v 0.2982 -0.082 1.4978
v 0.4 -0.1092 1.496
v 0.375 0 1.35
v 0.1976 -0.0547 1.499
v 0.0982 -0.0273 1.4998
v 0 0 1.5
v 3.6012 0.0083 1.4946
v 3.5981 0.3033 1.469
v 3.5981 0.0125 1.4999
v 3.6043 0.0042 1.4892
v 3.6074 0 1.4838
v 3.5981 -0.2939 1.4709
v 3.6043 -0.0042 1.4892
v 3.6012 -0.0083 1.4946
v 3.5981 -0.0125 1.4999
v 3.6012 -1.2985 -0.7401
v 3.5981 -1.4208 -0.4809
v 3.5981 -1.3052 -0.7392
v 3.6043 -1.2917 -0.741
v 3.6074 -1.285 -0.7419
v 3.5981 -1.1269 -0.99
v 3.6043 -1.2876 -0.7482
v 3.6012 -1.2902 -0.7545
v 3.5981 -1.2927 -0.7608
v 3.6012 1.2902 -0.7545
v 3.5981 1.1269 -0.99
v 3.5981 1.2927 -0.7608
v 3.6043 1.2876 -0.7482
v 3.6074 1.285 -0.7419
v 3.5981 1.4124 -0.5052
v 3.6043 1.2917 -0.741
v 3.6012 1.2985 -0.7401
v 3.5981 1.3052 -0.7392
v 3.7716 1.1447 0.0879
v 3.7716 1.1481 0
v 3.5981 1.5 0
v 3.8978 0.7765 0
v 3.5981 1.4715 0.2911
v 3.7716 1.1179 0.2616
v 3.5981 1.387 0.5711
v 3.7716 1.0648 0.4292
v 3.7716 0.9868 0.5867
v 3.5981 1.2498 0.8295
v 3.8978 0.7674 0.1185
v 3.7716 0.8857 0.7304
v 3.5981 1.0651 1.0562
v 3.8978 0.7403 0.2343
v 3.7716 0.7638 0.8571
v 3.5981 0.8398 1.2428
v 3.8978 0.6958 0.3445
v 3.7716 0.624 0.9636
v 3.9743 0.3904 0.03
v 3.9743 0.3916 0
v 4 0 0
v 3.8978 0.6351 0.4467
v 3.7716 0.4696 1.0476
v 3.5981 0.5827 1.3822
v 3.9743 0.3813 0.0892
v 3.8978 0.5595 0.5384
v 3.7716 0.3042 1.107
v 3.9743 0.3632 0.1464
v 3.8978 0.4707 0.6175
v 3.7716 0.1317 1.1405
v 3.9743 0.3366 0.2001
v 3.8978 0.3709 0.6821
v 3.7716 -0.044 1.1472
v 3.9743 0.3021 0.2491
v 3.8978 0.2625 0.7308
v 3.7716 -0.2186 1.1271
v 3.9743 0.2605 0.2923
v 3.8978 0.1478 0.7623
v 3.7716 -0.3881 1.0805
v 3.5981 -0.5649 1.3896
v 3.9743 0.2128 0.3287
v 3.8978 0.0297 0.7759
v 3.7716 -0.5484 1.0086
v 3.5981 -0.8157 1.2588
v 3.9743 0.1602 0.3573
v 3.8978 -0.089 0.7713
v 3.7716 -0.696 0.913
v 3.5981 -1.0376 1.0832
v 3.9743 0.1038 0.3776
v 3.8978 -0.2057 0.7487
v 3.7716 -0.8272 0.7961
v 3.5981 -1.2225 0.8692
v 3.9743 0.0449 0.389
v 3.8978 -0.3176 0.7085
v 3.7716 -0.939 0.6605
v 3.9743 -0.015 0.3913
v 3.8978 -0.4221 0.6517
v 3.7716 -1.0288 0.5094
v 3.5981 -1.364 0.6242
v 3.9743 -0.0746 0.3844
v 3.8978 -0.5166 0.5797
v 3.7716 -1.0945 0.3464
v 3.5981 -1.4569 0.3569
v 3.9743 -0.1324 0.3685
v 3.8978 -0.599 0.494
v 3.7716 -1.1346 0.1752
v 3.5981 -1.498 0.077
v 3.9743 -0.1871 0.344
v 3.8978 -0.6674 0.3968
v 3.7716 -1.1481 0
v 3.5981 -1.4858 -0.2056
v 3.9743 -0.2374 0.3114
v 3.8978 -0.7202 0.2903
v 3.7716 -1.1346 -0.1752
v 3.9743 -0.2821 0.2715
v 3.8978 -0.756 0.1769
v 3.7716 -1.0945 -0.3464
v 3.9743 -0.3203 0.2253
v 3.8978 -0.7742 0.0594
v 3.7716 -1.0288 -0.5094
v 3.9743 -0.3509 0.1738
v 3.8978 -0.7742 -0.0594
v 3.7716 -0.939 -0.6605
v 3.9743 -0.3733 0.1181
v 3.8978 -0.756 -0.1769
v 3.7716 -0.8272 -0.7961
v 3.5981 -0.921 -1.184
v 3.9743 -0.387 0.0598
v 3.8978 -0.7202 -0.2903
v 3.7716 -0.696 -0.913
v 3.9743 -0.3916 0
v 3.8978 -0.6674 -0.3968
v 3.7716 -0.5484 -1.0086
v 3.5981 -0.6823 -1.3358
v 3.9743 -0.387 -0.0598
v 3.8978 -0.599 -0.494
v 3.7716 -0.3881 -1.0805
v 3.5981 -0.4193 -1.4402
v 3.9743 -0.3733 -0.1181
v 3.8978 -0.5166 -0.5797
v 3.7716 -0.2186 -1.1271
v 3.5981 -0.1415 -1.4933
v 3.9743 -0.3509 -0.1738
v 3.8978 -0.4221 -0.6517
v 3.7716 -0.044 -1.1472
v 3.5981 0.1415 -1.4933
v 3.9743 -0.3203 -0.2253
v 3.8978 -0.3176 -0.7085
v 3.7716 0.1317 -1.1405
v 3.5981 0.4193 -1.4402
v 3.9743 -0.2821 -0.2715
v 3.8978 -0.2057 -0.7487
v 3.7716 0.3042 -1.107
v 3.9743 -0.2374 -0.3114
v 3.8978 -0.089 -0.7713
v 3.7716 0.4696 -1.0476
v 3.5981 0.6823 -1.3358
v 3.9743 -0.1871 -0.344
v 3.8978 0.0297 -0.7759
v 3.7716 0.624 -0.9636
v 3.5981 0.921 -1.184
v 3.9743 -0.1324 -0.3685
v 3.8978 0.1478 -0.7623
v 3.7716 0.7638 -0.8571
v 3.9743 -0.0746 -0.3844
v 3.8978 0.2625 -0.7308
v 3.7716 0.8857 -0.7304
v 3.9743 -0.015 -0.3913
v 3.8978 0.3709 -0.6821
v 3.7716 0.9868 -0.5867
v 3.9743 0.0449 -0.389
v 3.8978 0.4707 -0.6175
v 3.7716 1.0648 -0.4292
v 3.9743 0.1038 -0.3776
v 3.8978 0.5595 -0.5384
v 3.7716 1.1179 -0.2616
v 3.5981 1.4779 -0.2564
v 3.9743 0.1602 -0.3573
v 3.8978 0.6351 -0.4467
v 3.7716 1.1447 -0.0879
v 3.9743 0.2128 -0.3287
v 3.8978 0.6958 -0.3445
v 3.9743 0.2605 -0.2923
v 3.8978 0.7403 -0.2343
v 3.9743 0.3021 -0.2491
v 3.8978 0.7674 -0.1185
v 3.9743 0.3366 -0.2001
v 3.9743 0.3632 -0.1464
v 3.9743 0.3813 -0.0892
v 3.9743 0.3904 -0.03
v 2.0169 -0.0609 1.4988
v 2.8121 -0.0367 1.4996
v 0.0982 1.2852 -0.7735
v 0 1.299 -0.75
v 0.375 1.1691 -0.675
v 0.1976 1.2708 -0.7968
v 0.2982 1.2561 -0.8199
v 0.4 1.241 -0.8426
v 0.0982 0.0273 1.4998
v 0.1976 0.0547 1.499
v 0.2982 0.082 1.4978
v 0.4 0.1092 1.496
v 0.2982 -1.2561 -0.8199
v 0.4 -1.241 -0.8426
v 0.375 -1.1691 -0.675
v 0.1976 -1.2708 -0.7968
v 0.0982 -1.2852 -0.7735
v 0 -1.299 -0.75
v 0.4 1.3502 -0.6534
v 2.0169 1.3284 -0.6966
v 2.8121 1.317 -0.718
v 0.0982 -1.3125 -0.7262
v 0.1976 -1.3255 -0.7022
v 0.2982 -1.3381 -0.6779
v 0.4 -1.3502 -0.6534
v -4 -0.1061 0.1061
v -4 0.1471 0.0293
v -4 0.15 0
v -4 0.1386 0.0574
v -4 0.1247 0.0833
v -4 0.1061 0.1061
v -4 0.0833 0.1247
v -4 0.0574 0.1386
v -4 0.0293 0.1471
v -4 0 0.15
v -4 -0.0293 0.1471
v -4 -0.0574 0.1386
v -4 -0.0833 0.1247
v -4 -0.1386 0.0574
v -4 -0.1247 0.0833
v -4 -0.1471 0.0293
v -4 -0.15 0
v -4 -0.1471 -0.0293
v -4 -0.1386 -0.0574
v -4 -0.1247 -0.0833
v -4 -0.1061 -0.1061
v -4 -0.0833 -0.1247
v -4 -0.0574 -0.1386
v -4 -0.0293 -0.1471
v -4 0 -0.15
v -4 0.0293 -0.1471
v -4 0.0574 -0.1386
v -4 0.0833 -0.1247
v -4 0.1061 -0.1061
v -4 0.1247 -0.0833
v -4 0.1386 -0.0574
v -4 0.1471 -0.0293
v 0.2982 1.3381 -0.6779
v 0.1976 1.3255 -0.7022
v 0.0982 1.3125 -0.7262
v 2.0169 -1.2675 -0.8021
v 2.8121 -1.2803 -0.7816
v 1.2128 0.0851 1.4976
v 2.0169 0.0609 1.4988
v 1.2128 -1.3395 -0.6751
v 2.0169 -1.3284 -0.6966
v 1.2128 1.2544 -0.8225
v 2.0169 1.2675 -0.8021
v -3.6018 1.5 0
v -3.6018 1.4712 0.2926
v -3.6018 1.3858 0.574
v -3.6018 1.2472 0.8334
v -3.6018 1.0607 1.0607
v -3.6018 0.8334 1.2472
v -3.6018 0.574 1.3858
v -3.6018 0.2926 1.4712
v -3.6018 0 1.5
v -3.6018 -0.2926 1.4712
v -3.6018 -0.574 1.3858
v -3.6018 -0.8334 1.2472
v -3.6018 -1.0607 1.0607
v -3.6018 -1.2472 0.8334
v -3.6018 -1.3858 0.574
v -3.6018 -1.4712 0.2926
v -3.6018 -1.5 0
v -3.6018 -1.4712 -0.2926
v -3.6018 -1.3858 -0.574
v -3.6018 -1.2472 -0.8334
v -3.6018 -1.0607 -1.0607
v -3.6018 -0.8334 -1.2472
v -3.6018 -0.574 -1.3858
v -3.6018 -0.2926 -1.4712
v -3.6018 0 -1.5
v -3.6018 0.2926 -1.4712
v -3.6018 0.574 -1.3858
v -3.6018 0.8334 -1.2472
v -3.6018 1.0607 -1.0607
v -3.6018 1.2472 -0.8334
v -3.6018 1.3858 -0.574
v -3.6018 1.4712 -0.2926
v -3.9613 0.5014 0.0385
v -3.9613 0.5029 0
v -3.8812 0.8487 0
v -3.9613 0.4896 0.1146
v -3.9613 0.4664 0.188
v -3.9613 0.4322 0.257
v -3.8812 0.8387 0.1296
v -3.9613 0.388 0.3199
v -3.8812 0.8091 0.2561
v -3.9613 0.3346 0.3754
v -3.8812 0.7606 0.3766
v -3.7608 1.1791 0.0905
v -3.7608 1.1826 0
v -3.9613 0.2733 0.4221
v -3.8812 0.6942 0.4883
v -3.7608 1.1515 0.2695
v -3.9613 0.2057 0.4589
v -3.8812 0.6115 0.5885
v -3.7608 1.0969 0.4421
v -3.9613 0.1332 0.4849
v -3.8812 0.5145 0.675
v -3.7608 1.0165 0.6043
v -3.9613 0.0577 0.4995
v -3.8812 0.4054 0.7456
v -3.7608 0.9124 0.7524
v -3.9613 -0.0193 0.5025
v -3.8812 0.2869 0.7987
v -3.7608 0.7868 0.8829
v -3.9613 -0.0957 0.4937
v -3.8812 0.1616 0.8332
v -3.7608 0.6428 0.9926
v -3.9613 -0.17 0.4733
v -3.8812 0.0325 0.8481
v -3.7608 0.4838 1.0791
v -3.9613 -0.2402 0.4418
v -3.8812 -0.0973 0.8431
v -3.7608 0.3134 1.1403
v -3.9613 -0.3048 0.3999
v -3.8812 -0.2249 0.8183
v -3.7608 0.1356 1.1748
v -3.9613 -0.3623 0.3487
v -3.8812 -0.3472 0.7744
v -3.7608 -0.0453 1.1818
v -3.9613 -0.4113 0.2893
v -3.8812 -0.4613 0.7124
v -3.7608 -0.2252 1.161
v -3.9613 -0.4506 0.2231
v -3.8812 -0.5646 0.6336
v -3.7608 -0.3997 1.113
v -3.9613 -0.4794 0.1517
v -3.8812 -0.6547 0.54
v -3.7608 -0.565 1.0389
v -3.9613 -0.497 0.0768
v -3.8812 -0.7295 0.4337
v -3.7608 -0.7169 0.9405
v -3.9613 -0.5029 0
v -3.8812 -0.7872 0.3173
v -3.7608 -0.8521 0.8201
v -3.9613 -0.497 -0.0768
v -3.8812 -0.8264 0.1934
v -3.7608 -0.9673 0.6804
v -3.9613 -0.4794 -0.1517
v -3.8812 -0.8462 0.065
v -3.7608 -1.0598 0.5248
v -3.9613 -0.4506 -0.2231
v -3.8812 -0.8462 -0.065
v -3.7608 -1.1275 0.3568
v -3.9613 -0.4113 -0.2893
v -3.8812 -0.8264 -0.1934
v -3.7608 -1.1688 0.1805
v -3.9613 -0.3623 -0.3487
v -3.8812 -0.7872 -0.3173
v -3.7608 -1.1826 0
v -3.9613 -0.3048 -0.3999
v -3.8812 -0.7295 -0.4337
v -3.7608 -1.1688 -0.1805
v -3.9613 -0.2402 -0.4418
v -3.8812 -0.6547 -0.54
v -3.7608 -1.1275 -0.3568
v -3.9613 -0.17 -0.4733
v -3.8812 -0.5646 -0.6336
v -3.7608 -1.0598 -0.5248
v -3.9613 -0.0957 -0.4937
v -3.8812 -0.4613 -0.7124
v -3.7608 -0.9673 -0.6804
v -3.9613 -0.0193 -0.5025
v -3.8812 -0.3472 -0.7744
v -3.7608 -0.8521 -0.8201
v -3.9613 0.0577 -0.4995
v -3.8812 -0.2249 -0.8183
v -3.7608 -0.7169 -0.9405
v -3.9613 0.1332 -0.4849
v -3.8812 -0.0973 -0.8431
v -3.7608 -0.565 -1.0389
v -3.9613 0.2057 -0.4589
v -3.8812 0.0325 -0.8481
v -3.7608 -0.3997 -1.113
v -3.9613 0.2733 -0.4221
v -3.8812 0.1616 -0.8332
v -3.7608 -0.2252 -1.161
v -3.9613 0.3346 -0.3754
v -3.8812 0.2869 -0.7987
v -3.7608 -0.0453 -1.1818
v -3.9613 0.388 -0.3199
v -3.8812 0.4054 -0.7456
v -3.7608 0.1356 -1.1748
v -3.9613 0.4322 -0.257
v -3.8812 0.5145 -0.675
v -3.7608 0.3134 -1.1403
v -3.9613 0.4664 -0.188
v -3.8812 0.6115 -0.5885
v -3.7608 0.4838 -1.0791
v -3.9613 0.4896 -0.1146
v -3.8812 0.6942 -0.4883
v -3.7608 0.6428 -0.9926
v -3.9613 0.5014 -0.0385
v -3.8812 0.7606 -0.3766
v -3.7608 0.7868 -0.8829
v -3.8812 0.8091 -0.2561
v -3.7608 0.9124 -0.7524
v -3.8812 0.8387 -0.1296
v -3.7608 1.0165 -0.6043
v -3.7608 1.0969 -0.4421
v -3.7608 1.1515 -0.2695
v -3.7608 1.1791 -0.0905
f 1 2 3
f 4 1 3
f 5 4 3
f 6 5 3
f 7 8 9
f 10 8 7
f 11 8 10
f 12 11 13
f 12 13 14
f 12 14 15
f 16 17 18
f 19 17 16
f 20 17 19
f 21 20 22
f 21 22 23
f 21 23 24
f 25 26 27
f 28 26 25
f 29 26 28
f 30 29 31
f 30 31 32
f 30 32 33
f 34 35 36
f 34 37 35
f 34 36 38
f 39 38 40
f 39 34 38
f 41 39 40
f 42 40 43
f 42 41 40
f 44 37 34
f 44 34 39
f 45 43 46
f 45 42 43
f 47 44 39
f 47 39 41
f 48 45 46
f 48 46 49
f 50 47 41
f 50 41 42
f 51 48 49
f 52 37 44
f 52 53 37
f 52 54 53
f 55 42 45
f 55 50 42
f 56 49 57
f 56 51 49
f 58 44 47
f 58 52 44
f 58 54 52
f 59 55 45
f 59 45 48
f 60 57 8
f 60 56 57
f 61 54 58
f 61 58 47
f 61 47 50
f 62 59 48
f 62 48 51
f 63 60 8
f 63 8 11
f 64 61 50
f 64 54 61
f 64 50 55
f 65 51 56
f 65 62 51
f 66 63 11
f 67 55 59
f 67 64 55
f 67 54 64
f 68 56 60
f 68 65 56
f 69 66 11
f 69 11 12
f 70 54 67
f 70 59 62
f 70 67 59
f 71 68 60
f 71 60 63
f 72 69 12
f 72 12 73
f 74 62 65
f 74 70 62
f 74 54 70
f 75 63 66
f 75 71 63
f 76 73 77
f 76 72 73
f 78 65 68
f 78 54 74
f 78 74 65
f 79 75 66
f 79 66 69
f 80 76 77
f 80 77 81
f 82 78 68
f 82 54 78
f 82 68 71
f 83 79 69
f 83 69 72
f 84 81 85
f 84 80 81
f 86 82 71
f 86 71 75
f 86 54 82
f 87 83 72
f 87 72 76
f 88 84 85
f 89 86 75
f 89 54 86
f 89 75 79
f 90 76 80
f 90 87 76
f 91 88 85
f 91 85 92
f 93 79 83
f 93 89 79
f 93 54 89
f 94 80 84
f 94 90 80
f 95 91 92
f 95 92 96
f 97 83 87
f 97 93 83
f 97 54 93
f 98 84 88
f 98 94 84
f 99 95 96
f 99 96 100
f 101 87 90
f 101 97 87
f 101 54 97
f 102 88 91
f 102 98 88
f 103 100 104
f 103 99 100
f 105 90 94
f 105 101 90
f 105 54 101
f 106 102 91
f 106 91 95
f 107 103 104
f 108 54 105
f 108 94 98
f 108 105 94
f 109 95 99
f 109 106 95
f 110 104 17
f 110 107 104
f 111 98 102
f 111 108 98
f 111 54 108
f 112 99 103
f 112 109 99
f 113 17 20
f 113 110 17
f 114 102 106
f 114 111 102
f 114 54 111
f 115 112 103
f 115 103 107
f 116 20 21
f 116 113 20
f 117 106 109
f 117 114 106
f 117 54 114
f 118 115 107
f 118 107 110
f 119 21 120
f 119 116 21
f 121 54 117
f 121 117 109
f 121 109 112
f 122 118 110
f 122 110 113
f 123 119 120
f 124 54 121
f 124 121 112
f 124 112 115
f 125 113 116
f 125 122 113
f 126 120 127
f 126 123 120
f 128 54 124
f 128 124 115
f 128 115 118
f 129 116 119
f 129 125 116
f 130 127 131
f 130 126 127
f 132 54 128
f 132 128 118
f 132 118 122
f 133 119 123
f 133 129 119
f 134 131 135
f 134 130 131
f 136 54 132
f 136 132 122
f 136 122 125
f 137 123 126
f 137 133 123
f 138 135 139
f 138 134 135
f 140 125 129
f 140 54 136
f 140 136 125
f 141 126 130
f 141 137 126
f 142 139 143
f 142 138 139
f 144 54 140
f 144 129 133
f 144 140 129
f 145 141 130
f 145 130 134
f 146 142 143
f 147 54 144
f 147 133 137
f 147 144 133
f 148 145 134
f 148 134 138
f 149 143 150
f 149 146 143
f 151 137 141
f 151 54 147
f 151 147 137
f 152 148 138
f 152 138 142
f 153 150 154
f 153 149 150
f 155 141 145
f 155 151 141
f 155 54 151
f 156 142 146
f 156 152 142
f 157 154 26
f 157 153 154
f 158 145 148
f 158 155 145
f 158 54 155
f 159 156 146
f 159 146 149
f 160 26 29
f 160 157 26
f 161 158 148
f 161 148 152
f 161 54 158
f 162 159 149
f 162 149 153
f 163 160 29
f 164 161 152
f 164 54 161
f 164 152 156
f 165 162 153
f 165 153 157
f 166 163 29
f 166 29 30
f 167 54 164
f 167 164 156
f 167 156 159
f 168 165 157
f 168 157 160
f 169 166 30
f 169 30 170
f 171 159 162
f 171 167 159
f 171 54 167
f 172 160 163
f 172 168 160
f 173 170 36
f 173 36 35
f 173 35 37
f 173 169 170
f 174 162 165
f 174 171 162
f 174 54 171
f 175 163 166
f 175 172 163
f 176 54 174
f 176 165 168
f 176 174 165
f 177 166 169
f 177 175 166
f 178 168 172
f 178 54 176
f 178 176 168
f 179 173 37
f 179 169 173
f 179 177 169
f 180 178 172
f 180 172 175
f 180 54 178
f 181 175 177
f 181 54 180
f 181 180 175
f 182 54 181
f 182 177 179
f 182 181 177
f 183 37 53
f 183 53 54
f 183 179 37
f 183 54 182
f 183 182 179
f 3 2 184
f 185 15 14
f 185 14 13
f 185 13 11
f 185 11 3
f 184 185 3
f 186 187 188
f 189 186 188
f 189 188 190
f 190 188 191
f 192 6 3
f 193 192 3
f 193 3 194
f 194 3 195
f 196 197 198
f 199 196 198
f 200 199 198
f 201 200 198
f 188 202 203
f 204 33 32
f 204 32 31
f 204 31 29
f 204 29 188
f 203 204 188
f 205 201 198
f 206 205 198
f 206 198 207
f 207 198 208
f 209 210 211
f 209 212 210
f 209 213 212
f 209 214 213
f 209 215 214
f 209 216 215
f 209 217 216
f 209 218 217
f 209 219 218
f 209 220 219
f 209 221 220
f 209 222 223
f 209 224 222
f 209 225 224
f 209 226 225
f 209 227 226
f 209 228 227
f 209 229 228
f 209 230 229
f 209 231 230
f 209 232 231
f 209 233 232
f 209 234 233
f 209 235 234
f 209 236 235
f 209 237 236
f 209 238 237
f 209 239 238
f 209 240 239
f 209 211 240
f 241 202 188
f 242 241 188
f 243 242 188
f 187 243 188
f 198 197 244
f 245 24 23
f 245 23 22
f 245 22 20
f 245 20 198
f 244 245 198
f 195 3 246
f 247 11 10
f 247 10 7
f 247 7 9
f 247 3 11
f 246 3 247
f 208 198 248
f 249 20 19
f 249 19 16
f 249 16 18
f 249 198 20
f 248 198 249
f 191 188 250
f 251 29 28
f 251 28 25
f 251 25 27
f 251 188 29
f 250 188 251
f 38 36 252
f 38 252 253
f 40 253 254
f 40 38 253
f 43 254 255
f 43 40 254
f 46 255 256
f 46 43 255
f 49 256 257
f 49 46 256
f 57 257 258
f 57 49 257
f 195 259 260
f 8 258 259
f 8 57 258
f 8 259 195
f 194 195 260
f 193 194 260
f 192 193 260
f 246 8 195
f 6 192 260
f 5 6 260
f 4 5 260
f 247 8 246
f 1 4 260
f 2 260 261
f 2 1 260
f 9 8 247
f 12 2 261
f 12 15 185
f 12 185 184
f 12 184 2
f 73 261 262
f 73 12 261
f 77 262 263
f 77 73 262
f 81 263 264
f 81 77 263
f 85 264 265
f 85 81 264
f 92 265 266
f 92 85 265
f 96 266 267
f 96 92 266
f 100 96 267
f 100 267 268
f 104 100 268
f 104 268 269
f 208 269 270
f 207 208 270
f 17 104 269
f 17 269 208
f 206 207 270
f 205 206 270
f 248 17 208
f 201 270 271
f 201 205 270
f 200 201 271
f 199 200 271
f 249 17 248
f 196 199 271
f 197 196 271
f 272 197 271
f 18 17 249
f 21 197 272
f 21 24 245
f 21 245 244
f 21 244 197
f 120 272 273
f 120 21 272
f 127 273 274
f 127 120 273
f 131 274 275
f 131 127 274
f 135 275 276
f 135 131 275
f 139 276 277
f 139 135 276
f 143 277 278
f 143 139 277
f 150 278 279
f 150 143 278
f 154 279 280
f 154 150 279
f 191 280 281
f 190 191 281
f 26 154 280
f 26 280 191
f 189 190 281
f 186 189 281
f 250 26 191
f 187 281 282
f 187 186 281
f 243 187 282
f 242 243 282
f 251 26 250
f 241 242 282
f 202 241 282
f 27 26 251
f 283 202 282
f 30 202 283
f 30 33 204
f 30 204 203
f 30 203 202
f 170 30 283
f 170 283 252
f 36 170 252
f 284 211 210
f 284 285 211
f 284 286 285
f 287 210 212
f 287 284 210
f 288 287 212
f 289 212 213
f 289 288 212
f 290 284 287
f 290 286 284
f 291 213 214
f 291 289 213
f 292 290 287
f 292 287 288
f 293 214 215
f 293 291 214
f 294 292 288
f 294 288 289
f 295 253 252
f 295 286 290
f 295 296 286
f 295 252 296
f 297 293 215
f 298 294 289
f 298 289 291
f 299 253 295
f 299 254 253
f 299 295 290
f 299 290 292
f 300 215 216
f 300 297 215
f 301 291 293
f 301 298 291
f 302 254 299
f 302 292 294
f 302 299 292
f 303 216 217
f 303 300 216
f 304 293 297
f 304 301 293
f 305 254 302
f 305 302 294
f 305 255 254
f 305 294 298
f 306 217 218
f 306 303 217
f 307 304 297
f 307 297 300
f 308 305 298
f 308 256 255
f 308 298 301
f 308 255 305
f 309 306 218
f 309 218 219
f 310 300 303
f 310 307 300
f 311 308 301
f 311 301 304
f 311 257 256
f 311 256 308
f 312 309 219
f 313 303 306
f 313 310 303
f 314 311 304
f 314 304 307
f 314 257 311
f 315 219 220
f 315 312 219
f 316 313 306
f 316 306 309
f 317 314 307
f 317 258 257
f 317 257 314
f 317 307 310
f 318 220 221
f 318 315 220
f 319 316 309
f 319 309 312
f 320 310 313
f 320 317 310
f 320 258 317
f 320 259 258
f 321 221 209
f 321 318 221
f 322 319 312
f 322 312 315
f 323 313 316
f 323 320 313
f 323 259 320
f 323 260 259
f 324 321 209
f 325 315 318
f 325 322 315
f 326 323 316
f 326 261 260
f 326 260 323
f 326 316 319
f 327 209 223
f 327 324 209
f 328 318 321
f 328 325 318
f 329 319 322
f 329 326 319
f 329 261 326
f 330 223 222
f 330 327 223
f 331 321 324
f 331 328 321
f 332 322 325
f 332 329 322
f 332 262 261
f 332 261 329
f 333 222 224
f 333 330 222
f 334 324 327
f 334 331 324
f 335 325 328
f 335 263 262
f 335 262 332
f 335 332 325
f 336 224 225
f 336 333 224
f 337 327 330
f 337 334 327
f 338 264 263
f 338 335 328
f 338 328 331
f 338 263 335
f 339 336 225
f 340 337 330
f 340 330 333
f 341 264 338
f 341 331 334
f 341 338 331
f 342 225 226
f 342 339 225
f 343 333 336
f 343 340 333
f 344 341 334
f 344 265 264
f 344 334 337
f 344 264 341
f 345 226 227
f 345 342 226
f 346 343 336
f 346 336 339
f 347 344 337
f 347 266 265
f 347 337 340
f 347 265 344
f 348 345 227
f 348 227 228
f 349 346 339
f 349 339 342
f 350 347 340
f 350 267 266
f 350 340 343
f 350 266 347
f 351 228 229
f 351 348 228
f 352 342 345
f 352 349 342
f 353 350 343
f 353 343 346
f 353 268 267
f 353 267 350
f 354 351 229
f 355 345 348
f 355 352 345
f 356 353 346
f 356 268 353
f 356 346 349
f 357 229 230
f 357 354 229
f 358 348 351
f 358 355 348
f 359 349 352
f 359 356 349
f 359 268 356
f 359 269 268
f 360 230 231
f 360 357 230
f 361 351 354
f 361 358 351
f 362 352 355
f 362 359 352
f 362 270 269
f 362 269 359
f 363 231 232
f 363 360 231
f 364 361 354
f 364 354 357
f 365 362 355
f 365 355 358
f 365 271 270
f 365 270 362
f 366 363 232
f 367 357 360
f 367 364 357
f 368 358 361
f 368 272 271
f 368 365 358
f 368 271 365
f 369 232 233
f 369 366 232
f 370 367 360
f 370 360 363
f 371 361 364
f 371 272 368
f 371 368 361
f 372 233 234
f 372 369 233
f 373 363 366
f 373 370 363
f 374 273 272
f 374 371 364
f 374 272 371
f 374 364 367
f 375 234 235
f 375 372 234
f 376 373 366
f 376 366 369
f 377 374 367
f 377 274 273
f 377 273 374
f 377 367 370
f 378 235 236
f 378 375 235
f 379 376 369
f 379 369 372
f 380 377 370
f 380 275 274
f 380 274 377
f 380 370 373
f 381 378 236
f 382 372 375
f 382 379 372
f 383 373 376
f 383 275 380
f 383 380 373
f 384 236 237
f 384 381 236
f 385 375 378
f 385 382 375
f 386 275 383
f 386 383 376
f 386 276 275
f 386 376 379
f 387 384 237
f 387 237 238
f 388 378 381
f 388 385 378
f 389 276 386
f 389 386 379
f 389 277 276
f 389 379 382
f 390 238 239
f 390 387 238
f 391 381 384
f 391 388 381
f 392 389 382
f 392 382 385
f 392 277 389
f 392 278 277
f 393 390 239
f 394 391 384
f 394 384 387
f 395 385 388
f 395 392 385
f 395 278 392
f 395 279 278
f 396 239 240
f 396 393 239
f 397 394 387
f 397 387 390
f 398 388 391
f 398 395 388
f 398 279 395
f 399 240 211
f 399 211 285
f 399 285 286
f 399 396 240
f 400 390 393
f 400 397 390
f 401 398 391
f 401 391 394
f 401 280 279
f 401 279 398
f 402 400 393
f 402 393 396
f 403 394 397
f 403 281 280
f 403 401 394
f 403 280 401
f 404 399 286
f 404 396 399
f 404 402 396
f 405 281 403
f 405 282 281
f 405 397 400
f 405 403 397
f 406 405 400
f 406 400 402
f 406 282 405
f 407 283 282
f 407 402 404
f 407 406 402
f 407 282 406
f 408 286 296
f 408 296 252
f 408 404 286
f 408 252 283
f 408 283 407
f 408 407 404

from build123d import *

# Parameters (mm, degrees)
CIRPATTERN1_COUNT = 3


with BuildPart() as part:
    # Sketch1 → Base-Revolve (revolve)
    with BuildSketch(Plane.XY):
        with BuildLine():
            Line((-4, 0), (-4, 0.15))
            ThreePointArc((-4, 0.15), (-3.881206061, 0.848681403), (-3.601828558, 1.5))
            Line((-3.601828558, 1.5), (3.598076211, 1.5))
            ThreePointArc((3.598076211, 1.5), (3.897777479, 0.776457135), (4, 0))
            Line((4, 0), (-4, 0))
        make_face()
    revolve(axis=Axis((-57, 0, 0), (1, 0, 0)))

    # Cut-Sweep1: sweep along a path in Sketch3
    with BuildLine(Plane(origin=(0, 0, 0), x_dir=(1, 0, 0), z_dir=(0, 1, 0))) as cut_sweep1_path:
        Line((0, -1.5), (0.375, -1.35))
        Line((0.375, -1.35), (4, -1.5))
    # Sketch2 → Cut-Sweep1 (sweep, cut)
    with BuildSketch(Plane(origin=(0, 0, 0), x_dir=(0, 0, -1), z_dir=(1, 0, 0))):
        Polygon((-1.5, 0), (-3.378358908, 1.315241067), (-3.378358908, -1.315241067), align=None)
    cut_sweep1 = sweep(path=cut_sweep1_path.line, transition=Transition.RIGHT, mode=Mode.SUBTRACT)

    # CirPattern1: Cut-Sweep1 ×3 about axis
    cirpattern1_axis = Axis((0, 0, 0), (1, 0, 0))
    for i in range(1, CIRPATTERN1_COUNT):
        add(cut_sweep1.rotate(cirpattern1_axis, i * 360 / CIRPATTERN1_COUNT), mode=Mode.SUBTRACT)


solid = part.part
